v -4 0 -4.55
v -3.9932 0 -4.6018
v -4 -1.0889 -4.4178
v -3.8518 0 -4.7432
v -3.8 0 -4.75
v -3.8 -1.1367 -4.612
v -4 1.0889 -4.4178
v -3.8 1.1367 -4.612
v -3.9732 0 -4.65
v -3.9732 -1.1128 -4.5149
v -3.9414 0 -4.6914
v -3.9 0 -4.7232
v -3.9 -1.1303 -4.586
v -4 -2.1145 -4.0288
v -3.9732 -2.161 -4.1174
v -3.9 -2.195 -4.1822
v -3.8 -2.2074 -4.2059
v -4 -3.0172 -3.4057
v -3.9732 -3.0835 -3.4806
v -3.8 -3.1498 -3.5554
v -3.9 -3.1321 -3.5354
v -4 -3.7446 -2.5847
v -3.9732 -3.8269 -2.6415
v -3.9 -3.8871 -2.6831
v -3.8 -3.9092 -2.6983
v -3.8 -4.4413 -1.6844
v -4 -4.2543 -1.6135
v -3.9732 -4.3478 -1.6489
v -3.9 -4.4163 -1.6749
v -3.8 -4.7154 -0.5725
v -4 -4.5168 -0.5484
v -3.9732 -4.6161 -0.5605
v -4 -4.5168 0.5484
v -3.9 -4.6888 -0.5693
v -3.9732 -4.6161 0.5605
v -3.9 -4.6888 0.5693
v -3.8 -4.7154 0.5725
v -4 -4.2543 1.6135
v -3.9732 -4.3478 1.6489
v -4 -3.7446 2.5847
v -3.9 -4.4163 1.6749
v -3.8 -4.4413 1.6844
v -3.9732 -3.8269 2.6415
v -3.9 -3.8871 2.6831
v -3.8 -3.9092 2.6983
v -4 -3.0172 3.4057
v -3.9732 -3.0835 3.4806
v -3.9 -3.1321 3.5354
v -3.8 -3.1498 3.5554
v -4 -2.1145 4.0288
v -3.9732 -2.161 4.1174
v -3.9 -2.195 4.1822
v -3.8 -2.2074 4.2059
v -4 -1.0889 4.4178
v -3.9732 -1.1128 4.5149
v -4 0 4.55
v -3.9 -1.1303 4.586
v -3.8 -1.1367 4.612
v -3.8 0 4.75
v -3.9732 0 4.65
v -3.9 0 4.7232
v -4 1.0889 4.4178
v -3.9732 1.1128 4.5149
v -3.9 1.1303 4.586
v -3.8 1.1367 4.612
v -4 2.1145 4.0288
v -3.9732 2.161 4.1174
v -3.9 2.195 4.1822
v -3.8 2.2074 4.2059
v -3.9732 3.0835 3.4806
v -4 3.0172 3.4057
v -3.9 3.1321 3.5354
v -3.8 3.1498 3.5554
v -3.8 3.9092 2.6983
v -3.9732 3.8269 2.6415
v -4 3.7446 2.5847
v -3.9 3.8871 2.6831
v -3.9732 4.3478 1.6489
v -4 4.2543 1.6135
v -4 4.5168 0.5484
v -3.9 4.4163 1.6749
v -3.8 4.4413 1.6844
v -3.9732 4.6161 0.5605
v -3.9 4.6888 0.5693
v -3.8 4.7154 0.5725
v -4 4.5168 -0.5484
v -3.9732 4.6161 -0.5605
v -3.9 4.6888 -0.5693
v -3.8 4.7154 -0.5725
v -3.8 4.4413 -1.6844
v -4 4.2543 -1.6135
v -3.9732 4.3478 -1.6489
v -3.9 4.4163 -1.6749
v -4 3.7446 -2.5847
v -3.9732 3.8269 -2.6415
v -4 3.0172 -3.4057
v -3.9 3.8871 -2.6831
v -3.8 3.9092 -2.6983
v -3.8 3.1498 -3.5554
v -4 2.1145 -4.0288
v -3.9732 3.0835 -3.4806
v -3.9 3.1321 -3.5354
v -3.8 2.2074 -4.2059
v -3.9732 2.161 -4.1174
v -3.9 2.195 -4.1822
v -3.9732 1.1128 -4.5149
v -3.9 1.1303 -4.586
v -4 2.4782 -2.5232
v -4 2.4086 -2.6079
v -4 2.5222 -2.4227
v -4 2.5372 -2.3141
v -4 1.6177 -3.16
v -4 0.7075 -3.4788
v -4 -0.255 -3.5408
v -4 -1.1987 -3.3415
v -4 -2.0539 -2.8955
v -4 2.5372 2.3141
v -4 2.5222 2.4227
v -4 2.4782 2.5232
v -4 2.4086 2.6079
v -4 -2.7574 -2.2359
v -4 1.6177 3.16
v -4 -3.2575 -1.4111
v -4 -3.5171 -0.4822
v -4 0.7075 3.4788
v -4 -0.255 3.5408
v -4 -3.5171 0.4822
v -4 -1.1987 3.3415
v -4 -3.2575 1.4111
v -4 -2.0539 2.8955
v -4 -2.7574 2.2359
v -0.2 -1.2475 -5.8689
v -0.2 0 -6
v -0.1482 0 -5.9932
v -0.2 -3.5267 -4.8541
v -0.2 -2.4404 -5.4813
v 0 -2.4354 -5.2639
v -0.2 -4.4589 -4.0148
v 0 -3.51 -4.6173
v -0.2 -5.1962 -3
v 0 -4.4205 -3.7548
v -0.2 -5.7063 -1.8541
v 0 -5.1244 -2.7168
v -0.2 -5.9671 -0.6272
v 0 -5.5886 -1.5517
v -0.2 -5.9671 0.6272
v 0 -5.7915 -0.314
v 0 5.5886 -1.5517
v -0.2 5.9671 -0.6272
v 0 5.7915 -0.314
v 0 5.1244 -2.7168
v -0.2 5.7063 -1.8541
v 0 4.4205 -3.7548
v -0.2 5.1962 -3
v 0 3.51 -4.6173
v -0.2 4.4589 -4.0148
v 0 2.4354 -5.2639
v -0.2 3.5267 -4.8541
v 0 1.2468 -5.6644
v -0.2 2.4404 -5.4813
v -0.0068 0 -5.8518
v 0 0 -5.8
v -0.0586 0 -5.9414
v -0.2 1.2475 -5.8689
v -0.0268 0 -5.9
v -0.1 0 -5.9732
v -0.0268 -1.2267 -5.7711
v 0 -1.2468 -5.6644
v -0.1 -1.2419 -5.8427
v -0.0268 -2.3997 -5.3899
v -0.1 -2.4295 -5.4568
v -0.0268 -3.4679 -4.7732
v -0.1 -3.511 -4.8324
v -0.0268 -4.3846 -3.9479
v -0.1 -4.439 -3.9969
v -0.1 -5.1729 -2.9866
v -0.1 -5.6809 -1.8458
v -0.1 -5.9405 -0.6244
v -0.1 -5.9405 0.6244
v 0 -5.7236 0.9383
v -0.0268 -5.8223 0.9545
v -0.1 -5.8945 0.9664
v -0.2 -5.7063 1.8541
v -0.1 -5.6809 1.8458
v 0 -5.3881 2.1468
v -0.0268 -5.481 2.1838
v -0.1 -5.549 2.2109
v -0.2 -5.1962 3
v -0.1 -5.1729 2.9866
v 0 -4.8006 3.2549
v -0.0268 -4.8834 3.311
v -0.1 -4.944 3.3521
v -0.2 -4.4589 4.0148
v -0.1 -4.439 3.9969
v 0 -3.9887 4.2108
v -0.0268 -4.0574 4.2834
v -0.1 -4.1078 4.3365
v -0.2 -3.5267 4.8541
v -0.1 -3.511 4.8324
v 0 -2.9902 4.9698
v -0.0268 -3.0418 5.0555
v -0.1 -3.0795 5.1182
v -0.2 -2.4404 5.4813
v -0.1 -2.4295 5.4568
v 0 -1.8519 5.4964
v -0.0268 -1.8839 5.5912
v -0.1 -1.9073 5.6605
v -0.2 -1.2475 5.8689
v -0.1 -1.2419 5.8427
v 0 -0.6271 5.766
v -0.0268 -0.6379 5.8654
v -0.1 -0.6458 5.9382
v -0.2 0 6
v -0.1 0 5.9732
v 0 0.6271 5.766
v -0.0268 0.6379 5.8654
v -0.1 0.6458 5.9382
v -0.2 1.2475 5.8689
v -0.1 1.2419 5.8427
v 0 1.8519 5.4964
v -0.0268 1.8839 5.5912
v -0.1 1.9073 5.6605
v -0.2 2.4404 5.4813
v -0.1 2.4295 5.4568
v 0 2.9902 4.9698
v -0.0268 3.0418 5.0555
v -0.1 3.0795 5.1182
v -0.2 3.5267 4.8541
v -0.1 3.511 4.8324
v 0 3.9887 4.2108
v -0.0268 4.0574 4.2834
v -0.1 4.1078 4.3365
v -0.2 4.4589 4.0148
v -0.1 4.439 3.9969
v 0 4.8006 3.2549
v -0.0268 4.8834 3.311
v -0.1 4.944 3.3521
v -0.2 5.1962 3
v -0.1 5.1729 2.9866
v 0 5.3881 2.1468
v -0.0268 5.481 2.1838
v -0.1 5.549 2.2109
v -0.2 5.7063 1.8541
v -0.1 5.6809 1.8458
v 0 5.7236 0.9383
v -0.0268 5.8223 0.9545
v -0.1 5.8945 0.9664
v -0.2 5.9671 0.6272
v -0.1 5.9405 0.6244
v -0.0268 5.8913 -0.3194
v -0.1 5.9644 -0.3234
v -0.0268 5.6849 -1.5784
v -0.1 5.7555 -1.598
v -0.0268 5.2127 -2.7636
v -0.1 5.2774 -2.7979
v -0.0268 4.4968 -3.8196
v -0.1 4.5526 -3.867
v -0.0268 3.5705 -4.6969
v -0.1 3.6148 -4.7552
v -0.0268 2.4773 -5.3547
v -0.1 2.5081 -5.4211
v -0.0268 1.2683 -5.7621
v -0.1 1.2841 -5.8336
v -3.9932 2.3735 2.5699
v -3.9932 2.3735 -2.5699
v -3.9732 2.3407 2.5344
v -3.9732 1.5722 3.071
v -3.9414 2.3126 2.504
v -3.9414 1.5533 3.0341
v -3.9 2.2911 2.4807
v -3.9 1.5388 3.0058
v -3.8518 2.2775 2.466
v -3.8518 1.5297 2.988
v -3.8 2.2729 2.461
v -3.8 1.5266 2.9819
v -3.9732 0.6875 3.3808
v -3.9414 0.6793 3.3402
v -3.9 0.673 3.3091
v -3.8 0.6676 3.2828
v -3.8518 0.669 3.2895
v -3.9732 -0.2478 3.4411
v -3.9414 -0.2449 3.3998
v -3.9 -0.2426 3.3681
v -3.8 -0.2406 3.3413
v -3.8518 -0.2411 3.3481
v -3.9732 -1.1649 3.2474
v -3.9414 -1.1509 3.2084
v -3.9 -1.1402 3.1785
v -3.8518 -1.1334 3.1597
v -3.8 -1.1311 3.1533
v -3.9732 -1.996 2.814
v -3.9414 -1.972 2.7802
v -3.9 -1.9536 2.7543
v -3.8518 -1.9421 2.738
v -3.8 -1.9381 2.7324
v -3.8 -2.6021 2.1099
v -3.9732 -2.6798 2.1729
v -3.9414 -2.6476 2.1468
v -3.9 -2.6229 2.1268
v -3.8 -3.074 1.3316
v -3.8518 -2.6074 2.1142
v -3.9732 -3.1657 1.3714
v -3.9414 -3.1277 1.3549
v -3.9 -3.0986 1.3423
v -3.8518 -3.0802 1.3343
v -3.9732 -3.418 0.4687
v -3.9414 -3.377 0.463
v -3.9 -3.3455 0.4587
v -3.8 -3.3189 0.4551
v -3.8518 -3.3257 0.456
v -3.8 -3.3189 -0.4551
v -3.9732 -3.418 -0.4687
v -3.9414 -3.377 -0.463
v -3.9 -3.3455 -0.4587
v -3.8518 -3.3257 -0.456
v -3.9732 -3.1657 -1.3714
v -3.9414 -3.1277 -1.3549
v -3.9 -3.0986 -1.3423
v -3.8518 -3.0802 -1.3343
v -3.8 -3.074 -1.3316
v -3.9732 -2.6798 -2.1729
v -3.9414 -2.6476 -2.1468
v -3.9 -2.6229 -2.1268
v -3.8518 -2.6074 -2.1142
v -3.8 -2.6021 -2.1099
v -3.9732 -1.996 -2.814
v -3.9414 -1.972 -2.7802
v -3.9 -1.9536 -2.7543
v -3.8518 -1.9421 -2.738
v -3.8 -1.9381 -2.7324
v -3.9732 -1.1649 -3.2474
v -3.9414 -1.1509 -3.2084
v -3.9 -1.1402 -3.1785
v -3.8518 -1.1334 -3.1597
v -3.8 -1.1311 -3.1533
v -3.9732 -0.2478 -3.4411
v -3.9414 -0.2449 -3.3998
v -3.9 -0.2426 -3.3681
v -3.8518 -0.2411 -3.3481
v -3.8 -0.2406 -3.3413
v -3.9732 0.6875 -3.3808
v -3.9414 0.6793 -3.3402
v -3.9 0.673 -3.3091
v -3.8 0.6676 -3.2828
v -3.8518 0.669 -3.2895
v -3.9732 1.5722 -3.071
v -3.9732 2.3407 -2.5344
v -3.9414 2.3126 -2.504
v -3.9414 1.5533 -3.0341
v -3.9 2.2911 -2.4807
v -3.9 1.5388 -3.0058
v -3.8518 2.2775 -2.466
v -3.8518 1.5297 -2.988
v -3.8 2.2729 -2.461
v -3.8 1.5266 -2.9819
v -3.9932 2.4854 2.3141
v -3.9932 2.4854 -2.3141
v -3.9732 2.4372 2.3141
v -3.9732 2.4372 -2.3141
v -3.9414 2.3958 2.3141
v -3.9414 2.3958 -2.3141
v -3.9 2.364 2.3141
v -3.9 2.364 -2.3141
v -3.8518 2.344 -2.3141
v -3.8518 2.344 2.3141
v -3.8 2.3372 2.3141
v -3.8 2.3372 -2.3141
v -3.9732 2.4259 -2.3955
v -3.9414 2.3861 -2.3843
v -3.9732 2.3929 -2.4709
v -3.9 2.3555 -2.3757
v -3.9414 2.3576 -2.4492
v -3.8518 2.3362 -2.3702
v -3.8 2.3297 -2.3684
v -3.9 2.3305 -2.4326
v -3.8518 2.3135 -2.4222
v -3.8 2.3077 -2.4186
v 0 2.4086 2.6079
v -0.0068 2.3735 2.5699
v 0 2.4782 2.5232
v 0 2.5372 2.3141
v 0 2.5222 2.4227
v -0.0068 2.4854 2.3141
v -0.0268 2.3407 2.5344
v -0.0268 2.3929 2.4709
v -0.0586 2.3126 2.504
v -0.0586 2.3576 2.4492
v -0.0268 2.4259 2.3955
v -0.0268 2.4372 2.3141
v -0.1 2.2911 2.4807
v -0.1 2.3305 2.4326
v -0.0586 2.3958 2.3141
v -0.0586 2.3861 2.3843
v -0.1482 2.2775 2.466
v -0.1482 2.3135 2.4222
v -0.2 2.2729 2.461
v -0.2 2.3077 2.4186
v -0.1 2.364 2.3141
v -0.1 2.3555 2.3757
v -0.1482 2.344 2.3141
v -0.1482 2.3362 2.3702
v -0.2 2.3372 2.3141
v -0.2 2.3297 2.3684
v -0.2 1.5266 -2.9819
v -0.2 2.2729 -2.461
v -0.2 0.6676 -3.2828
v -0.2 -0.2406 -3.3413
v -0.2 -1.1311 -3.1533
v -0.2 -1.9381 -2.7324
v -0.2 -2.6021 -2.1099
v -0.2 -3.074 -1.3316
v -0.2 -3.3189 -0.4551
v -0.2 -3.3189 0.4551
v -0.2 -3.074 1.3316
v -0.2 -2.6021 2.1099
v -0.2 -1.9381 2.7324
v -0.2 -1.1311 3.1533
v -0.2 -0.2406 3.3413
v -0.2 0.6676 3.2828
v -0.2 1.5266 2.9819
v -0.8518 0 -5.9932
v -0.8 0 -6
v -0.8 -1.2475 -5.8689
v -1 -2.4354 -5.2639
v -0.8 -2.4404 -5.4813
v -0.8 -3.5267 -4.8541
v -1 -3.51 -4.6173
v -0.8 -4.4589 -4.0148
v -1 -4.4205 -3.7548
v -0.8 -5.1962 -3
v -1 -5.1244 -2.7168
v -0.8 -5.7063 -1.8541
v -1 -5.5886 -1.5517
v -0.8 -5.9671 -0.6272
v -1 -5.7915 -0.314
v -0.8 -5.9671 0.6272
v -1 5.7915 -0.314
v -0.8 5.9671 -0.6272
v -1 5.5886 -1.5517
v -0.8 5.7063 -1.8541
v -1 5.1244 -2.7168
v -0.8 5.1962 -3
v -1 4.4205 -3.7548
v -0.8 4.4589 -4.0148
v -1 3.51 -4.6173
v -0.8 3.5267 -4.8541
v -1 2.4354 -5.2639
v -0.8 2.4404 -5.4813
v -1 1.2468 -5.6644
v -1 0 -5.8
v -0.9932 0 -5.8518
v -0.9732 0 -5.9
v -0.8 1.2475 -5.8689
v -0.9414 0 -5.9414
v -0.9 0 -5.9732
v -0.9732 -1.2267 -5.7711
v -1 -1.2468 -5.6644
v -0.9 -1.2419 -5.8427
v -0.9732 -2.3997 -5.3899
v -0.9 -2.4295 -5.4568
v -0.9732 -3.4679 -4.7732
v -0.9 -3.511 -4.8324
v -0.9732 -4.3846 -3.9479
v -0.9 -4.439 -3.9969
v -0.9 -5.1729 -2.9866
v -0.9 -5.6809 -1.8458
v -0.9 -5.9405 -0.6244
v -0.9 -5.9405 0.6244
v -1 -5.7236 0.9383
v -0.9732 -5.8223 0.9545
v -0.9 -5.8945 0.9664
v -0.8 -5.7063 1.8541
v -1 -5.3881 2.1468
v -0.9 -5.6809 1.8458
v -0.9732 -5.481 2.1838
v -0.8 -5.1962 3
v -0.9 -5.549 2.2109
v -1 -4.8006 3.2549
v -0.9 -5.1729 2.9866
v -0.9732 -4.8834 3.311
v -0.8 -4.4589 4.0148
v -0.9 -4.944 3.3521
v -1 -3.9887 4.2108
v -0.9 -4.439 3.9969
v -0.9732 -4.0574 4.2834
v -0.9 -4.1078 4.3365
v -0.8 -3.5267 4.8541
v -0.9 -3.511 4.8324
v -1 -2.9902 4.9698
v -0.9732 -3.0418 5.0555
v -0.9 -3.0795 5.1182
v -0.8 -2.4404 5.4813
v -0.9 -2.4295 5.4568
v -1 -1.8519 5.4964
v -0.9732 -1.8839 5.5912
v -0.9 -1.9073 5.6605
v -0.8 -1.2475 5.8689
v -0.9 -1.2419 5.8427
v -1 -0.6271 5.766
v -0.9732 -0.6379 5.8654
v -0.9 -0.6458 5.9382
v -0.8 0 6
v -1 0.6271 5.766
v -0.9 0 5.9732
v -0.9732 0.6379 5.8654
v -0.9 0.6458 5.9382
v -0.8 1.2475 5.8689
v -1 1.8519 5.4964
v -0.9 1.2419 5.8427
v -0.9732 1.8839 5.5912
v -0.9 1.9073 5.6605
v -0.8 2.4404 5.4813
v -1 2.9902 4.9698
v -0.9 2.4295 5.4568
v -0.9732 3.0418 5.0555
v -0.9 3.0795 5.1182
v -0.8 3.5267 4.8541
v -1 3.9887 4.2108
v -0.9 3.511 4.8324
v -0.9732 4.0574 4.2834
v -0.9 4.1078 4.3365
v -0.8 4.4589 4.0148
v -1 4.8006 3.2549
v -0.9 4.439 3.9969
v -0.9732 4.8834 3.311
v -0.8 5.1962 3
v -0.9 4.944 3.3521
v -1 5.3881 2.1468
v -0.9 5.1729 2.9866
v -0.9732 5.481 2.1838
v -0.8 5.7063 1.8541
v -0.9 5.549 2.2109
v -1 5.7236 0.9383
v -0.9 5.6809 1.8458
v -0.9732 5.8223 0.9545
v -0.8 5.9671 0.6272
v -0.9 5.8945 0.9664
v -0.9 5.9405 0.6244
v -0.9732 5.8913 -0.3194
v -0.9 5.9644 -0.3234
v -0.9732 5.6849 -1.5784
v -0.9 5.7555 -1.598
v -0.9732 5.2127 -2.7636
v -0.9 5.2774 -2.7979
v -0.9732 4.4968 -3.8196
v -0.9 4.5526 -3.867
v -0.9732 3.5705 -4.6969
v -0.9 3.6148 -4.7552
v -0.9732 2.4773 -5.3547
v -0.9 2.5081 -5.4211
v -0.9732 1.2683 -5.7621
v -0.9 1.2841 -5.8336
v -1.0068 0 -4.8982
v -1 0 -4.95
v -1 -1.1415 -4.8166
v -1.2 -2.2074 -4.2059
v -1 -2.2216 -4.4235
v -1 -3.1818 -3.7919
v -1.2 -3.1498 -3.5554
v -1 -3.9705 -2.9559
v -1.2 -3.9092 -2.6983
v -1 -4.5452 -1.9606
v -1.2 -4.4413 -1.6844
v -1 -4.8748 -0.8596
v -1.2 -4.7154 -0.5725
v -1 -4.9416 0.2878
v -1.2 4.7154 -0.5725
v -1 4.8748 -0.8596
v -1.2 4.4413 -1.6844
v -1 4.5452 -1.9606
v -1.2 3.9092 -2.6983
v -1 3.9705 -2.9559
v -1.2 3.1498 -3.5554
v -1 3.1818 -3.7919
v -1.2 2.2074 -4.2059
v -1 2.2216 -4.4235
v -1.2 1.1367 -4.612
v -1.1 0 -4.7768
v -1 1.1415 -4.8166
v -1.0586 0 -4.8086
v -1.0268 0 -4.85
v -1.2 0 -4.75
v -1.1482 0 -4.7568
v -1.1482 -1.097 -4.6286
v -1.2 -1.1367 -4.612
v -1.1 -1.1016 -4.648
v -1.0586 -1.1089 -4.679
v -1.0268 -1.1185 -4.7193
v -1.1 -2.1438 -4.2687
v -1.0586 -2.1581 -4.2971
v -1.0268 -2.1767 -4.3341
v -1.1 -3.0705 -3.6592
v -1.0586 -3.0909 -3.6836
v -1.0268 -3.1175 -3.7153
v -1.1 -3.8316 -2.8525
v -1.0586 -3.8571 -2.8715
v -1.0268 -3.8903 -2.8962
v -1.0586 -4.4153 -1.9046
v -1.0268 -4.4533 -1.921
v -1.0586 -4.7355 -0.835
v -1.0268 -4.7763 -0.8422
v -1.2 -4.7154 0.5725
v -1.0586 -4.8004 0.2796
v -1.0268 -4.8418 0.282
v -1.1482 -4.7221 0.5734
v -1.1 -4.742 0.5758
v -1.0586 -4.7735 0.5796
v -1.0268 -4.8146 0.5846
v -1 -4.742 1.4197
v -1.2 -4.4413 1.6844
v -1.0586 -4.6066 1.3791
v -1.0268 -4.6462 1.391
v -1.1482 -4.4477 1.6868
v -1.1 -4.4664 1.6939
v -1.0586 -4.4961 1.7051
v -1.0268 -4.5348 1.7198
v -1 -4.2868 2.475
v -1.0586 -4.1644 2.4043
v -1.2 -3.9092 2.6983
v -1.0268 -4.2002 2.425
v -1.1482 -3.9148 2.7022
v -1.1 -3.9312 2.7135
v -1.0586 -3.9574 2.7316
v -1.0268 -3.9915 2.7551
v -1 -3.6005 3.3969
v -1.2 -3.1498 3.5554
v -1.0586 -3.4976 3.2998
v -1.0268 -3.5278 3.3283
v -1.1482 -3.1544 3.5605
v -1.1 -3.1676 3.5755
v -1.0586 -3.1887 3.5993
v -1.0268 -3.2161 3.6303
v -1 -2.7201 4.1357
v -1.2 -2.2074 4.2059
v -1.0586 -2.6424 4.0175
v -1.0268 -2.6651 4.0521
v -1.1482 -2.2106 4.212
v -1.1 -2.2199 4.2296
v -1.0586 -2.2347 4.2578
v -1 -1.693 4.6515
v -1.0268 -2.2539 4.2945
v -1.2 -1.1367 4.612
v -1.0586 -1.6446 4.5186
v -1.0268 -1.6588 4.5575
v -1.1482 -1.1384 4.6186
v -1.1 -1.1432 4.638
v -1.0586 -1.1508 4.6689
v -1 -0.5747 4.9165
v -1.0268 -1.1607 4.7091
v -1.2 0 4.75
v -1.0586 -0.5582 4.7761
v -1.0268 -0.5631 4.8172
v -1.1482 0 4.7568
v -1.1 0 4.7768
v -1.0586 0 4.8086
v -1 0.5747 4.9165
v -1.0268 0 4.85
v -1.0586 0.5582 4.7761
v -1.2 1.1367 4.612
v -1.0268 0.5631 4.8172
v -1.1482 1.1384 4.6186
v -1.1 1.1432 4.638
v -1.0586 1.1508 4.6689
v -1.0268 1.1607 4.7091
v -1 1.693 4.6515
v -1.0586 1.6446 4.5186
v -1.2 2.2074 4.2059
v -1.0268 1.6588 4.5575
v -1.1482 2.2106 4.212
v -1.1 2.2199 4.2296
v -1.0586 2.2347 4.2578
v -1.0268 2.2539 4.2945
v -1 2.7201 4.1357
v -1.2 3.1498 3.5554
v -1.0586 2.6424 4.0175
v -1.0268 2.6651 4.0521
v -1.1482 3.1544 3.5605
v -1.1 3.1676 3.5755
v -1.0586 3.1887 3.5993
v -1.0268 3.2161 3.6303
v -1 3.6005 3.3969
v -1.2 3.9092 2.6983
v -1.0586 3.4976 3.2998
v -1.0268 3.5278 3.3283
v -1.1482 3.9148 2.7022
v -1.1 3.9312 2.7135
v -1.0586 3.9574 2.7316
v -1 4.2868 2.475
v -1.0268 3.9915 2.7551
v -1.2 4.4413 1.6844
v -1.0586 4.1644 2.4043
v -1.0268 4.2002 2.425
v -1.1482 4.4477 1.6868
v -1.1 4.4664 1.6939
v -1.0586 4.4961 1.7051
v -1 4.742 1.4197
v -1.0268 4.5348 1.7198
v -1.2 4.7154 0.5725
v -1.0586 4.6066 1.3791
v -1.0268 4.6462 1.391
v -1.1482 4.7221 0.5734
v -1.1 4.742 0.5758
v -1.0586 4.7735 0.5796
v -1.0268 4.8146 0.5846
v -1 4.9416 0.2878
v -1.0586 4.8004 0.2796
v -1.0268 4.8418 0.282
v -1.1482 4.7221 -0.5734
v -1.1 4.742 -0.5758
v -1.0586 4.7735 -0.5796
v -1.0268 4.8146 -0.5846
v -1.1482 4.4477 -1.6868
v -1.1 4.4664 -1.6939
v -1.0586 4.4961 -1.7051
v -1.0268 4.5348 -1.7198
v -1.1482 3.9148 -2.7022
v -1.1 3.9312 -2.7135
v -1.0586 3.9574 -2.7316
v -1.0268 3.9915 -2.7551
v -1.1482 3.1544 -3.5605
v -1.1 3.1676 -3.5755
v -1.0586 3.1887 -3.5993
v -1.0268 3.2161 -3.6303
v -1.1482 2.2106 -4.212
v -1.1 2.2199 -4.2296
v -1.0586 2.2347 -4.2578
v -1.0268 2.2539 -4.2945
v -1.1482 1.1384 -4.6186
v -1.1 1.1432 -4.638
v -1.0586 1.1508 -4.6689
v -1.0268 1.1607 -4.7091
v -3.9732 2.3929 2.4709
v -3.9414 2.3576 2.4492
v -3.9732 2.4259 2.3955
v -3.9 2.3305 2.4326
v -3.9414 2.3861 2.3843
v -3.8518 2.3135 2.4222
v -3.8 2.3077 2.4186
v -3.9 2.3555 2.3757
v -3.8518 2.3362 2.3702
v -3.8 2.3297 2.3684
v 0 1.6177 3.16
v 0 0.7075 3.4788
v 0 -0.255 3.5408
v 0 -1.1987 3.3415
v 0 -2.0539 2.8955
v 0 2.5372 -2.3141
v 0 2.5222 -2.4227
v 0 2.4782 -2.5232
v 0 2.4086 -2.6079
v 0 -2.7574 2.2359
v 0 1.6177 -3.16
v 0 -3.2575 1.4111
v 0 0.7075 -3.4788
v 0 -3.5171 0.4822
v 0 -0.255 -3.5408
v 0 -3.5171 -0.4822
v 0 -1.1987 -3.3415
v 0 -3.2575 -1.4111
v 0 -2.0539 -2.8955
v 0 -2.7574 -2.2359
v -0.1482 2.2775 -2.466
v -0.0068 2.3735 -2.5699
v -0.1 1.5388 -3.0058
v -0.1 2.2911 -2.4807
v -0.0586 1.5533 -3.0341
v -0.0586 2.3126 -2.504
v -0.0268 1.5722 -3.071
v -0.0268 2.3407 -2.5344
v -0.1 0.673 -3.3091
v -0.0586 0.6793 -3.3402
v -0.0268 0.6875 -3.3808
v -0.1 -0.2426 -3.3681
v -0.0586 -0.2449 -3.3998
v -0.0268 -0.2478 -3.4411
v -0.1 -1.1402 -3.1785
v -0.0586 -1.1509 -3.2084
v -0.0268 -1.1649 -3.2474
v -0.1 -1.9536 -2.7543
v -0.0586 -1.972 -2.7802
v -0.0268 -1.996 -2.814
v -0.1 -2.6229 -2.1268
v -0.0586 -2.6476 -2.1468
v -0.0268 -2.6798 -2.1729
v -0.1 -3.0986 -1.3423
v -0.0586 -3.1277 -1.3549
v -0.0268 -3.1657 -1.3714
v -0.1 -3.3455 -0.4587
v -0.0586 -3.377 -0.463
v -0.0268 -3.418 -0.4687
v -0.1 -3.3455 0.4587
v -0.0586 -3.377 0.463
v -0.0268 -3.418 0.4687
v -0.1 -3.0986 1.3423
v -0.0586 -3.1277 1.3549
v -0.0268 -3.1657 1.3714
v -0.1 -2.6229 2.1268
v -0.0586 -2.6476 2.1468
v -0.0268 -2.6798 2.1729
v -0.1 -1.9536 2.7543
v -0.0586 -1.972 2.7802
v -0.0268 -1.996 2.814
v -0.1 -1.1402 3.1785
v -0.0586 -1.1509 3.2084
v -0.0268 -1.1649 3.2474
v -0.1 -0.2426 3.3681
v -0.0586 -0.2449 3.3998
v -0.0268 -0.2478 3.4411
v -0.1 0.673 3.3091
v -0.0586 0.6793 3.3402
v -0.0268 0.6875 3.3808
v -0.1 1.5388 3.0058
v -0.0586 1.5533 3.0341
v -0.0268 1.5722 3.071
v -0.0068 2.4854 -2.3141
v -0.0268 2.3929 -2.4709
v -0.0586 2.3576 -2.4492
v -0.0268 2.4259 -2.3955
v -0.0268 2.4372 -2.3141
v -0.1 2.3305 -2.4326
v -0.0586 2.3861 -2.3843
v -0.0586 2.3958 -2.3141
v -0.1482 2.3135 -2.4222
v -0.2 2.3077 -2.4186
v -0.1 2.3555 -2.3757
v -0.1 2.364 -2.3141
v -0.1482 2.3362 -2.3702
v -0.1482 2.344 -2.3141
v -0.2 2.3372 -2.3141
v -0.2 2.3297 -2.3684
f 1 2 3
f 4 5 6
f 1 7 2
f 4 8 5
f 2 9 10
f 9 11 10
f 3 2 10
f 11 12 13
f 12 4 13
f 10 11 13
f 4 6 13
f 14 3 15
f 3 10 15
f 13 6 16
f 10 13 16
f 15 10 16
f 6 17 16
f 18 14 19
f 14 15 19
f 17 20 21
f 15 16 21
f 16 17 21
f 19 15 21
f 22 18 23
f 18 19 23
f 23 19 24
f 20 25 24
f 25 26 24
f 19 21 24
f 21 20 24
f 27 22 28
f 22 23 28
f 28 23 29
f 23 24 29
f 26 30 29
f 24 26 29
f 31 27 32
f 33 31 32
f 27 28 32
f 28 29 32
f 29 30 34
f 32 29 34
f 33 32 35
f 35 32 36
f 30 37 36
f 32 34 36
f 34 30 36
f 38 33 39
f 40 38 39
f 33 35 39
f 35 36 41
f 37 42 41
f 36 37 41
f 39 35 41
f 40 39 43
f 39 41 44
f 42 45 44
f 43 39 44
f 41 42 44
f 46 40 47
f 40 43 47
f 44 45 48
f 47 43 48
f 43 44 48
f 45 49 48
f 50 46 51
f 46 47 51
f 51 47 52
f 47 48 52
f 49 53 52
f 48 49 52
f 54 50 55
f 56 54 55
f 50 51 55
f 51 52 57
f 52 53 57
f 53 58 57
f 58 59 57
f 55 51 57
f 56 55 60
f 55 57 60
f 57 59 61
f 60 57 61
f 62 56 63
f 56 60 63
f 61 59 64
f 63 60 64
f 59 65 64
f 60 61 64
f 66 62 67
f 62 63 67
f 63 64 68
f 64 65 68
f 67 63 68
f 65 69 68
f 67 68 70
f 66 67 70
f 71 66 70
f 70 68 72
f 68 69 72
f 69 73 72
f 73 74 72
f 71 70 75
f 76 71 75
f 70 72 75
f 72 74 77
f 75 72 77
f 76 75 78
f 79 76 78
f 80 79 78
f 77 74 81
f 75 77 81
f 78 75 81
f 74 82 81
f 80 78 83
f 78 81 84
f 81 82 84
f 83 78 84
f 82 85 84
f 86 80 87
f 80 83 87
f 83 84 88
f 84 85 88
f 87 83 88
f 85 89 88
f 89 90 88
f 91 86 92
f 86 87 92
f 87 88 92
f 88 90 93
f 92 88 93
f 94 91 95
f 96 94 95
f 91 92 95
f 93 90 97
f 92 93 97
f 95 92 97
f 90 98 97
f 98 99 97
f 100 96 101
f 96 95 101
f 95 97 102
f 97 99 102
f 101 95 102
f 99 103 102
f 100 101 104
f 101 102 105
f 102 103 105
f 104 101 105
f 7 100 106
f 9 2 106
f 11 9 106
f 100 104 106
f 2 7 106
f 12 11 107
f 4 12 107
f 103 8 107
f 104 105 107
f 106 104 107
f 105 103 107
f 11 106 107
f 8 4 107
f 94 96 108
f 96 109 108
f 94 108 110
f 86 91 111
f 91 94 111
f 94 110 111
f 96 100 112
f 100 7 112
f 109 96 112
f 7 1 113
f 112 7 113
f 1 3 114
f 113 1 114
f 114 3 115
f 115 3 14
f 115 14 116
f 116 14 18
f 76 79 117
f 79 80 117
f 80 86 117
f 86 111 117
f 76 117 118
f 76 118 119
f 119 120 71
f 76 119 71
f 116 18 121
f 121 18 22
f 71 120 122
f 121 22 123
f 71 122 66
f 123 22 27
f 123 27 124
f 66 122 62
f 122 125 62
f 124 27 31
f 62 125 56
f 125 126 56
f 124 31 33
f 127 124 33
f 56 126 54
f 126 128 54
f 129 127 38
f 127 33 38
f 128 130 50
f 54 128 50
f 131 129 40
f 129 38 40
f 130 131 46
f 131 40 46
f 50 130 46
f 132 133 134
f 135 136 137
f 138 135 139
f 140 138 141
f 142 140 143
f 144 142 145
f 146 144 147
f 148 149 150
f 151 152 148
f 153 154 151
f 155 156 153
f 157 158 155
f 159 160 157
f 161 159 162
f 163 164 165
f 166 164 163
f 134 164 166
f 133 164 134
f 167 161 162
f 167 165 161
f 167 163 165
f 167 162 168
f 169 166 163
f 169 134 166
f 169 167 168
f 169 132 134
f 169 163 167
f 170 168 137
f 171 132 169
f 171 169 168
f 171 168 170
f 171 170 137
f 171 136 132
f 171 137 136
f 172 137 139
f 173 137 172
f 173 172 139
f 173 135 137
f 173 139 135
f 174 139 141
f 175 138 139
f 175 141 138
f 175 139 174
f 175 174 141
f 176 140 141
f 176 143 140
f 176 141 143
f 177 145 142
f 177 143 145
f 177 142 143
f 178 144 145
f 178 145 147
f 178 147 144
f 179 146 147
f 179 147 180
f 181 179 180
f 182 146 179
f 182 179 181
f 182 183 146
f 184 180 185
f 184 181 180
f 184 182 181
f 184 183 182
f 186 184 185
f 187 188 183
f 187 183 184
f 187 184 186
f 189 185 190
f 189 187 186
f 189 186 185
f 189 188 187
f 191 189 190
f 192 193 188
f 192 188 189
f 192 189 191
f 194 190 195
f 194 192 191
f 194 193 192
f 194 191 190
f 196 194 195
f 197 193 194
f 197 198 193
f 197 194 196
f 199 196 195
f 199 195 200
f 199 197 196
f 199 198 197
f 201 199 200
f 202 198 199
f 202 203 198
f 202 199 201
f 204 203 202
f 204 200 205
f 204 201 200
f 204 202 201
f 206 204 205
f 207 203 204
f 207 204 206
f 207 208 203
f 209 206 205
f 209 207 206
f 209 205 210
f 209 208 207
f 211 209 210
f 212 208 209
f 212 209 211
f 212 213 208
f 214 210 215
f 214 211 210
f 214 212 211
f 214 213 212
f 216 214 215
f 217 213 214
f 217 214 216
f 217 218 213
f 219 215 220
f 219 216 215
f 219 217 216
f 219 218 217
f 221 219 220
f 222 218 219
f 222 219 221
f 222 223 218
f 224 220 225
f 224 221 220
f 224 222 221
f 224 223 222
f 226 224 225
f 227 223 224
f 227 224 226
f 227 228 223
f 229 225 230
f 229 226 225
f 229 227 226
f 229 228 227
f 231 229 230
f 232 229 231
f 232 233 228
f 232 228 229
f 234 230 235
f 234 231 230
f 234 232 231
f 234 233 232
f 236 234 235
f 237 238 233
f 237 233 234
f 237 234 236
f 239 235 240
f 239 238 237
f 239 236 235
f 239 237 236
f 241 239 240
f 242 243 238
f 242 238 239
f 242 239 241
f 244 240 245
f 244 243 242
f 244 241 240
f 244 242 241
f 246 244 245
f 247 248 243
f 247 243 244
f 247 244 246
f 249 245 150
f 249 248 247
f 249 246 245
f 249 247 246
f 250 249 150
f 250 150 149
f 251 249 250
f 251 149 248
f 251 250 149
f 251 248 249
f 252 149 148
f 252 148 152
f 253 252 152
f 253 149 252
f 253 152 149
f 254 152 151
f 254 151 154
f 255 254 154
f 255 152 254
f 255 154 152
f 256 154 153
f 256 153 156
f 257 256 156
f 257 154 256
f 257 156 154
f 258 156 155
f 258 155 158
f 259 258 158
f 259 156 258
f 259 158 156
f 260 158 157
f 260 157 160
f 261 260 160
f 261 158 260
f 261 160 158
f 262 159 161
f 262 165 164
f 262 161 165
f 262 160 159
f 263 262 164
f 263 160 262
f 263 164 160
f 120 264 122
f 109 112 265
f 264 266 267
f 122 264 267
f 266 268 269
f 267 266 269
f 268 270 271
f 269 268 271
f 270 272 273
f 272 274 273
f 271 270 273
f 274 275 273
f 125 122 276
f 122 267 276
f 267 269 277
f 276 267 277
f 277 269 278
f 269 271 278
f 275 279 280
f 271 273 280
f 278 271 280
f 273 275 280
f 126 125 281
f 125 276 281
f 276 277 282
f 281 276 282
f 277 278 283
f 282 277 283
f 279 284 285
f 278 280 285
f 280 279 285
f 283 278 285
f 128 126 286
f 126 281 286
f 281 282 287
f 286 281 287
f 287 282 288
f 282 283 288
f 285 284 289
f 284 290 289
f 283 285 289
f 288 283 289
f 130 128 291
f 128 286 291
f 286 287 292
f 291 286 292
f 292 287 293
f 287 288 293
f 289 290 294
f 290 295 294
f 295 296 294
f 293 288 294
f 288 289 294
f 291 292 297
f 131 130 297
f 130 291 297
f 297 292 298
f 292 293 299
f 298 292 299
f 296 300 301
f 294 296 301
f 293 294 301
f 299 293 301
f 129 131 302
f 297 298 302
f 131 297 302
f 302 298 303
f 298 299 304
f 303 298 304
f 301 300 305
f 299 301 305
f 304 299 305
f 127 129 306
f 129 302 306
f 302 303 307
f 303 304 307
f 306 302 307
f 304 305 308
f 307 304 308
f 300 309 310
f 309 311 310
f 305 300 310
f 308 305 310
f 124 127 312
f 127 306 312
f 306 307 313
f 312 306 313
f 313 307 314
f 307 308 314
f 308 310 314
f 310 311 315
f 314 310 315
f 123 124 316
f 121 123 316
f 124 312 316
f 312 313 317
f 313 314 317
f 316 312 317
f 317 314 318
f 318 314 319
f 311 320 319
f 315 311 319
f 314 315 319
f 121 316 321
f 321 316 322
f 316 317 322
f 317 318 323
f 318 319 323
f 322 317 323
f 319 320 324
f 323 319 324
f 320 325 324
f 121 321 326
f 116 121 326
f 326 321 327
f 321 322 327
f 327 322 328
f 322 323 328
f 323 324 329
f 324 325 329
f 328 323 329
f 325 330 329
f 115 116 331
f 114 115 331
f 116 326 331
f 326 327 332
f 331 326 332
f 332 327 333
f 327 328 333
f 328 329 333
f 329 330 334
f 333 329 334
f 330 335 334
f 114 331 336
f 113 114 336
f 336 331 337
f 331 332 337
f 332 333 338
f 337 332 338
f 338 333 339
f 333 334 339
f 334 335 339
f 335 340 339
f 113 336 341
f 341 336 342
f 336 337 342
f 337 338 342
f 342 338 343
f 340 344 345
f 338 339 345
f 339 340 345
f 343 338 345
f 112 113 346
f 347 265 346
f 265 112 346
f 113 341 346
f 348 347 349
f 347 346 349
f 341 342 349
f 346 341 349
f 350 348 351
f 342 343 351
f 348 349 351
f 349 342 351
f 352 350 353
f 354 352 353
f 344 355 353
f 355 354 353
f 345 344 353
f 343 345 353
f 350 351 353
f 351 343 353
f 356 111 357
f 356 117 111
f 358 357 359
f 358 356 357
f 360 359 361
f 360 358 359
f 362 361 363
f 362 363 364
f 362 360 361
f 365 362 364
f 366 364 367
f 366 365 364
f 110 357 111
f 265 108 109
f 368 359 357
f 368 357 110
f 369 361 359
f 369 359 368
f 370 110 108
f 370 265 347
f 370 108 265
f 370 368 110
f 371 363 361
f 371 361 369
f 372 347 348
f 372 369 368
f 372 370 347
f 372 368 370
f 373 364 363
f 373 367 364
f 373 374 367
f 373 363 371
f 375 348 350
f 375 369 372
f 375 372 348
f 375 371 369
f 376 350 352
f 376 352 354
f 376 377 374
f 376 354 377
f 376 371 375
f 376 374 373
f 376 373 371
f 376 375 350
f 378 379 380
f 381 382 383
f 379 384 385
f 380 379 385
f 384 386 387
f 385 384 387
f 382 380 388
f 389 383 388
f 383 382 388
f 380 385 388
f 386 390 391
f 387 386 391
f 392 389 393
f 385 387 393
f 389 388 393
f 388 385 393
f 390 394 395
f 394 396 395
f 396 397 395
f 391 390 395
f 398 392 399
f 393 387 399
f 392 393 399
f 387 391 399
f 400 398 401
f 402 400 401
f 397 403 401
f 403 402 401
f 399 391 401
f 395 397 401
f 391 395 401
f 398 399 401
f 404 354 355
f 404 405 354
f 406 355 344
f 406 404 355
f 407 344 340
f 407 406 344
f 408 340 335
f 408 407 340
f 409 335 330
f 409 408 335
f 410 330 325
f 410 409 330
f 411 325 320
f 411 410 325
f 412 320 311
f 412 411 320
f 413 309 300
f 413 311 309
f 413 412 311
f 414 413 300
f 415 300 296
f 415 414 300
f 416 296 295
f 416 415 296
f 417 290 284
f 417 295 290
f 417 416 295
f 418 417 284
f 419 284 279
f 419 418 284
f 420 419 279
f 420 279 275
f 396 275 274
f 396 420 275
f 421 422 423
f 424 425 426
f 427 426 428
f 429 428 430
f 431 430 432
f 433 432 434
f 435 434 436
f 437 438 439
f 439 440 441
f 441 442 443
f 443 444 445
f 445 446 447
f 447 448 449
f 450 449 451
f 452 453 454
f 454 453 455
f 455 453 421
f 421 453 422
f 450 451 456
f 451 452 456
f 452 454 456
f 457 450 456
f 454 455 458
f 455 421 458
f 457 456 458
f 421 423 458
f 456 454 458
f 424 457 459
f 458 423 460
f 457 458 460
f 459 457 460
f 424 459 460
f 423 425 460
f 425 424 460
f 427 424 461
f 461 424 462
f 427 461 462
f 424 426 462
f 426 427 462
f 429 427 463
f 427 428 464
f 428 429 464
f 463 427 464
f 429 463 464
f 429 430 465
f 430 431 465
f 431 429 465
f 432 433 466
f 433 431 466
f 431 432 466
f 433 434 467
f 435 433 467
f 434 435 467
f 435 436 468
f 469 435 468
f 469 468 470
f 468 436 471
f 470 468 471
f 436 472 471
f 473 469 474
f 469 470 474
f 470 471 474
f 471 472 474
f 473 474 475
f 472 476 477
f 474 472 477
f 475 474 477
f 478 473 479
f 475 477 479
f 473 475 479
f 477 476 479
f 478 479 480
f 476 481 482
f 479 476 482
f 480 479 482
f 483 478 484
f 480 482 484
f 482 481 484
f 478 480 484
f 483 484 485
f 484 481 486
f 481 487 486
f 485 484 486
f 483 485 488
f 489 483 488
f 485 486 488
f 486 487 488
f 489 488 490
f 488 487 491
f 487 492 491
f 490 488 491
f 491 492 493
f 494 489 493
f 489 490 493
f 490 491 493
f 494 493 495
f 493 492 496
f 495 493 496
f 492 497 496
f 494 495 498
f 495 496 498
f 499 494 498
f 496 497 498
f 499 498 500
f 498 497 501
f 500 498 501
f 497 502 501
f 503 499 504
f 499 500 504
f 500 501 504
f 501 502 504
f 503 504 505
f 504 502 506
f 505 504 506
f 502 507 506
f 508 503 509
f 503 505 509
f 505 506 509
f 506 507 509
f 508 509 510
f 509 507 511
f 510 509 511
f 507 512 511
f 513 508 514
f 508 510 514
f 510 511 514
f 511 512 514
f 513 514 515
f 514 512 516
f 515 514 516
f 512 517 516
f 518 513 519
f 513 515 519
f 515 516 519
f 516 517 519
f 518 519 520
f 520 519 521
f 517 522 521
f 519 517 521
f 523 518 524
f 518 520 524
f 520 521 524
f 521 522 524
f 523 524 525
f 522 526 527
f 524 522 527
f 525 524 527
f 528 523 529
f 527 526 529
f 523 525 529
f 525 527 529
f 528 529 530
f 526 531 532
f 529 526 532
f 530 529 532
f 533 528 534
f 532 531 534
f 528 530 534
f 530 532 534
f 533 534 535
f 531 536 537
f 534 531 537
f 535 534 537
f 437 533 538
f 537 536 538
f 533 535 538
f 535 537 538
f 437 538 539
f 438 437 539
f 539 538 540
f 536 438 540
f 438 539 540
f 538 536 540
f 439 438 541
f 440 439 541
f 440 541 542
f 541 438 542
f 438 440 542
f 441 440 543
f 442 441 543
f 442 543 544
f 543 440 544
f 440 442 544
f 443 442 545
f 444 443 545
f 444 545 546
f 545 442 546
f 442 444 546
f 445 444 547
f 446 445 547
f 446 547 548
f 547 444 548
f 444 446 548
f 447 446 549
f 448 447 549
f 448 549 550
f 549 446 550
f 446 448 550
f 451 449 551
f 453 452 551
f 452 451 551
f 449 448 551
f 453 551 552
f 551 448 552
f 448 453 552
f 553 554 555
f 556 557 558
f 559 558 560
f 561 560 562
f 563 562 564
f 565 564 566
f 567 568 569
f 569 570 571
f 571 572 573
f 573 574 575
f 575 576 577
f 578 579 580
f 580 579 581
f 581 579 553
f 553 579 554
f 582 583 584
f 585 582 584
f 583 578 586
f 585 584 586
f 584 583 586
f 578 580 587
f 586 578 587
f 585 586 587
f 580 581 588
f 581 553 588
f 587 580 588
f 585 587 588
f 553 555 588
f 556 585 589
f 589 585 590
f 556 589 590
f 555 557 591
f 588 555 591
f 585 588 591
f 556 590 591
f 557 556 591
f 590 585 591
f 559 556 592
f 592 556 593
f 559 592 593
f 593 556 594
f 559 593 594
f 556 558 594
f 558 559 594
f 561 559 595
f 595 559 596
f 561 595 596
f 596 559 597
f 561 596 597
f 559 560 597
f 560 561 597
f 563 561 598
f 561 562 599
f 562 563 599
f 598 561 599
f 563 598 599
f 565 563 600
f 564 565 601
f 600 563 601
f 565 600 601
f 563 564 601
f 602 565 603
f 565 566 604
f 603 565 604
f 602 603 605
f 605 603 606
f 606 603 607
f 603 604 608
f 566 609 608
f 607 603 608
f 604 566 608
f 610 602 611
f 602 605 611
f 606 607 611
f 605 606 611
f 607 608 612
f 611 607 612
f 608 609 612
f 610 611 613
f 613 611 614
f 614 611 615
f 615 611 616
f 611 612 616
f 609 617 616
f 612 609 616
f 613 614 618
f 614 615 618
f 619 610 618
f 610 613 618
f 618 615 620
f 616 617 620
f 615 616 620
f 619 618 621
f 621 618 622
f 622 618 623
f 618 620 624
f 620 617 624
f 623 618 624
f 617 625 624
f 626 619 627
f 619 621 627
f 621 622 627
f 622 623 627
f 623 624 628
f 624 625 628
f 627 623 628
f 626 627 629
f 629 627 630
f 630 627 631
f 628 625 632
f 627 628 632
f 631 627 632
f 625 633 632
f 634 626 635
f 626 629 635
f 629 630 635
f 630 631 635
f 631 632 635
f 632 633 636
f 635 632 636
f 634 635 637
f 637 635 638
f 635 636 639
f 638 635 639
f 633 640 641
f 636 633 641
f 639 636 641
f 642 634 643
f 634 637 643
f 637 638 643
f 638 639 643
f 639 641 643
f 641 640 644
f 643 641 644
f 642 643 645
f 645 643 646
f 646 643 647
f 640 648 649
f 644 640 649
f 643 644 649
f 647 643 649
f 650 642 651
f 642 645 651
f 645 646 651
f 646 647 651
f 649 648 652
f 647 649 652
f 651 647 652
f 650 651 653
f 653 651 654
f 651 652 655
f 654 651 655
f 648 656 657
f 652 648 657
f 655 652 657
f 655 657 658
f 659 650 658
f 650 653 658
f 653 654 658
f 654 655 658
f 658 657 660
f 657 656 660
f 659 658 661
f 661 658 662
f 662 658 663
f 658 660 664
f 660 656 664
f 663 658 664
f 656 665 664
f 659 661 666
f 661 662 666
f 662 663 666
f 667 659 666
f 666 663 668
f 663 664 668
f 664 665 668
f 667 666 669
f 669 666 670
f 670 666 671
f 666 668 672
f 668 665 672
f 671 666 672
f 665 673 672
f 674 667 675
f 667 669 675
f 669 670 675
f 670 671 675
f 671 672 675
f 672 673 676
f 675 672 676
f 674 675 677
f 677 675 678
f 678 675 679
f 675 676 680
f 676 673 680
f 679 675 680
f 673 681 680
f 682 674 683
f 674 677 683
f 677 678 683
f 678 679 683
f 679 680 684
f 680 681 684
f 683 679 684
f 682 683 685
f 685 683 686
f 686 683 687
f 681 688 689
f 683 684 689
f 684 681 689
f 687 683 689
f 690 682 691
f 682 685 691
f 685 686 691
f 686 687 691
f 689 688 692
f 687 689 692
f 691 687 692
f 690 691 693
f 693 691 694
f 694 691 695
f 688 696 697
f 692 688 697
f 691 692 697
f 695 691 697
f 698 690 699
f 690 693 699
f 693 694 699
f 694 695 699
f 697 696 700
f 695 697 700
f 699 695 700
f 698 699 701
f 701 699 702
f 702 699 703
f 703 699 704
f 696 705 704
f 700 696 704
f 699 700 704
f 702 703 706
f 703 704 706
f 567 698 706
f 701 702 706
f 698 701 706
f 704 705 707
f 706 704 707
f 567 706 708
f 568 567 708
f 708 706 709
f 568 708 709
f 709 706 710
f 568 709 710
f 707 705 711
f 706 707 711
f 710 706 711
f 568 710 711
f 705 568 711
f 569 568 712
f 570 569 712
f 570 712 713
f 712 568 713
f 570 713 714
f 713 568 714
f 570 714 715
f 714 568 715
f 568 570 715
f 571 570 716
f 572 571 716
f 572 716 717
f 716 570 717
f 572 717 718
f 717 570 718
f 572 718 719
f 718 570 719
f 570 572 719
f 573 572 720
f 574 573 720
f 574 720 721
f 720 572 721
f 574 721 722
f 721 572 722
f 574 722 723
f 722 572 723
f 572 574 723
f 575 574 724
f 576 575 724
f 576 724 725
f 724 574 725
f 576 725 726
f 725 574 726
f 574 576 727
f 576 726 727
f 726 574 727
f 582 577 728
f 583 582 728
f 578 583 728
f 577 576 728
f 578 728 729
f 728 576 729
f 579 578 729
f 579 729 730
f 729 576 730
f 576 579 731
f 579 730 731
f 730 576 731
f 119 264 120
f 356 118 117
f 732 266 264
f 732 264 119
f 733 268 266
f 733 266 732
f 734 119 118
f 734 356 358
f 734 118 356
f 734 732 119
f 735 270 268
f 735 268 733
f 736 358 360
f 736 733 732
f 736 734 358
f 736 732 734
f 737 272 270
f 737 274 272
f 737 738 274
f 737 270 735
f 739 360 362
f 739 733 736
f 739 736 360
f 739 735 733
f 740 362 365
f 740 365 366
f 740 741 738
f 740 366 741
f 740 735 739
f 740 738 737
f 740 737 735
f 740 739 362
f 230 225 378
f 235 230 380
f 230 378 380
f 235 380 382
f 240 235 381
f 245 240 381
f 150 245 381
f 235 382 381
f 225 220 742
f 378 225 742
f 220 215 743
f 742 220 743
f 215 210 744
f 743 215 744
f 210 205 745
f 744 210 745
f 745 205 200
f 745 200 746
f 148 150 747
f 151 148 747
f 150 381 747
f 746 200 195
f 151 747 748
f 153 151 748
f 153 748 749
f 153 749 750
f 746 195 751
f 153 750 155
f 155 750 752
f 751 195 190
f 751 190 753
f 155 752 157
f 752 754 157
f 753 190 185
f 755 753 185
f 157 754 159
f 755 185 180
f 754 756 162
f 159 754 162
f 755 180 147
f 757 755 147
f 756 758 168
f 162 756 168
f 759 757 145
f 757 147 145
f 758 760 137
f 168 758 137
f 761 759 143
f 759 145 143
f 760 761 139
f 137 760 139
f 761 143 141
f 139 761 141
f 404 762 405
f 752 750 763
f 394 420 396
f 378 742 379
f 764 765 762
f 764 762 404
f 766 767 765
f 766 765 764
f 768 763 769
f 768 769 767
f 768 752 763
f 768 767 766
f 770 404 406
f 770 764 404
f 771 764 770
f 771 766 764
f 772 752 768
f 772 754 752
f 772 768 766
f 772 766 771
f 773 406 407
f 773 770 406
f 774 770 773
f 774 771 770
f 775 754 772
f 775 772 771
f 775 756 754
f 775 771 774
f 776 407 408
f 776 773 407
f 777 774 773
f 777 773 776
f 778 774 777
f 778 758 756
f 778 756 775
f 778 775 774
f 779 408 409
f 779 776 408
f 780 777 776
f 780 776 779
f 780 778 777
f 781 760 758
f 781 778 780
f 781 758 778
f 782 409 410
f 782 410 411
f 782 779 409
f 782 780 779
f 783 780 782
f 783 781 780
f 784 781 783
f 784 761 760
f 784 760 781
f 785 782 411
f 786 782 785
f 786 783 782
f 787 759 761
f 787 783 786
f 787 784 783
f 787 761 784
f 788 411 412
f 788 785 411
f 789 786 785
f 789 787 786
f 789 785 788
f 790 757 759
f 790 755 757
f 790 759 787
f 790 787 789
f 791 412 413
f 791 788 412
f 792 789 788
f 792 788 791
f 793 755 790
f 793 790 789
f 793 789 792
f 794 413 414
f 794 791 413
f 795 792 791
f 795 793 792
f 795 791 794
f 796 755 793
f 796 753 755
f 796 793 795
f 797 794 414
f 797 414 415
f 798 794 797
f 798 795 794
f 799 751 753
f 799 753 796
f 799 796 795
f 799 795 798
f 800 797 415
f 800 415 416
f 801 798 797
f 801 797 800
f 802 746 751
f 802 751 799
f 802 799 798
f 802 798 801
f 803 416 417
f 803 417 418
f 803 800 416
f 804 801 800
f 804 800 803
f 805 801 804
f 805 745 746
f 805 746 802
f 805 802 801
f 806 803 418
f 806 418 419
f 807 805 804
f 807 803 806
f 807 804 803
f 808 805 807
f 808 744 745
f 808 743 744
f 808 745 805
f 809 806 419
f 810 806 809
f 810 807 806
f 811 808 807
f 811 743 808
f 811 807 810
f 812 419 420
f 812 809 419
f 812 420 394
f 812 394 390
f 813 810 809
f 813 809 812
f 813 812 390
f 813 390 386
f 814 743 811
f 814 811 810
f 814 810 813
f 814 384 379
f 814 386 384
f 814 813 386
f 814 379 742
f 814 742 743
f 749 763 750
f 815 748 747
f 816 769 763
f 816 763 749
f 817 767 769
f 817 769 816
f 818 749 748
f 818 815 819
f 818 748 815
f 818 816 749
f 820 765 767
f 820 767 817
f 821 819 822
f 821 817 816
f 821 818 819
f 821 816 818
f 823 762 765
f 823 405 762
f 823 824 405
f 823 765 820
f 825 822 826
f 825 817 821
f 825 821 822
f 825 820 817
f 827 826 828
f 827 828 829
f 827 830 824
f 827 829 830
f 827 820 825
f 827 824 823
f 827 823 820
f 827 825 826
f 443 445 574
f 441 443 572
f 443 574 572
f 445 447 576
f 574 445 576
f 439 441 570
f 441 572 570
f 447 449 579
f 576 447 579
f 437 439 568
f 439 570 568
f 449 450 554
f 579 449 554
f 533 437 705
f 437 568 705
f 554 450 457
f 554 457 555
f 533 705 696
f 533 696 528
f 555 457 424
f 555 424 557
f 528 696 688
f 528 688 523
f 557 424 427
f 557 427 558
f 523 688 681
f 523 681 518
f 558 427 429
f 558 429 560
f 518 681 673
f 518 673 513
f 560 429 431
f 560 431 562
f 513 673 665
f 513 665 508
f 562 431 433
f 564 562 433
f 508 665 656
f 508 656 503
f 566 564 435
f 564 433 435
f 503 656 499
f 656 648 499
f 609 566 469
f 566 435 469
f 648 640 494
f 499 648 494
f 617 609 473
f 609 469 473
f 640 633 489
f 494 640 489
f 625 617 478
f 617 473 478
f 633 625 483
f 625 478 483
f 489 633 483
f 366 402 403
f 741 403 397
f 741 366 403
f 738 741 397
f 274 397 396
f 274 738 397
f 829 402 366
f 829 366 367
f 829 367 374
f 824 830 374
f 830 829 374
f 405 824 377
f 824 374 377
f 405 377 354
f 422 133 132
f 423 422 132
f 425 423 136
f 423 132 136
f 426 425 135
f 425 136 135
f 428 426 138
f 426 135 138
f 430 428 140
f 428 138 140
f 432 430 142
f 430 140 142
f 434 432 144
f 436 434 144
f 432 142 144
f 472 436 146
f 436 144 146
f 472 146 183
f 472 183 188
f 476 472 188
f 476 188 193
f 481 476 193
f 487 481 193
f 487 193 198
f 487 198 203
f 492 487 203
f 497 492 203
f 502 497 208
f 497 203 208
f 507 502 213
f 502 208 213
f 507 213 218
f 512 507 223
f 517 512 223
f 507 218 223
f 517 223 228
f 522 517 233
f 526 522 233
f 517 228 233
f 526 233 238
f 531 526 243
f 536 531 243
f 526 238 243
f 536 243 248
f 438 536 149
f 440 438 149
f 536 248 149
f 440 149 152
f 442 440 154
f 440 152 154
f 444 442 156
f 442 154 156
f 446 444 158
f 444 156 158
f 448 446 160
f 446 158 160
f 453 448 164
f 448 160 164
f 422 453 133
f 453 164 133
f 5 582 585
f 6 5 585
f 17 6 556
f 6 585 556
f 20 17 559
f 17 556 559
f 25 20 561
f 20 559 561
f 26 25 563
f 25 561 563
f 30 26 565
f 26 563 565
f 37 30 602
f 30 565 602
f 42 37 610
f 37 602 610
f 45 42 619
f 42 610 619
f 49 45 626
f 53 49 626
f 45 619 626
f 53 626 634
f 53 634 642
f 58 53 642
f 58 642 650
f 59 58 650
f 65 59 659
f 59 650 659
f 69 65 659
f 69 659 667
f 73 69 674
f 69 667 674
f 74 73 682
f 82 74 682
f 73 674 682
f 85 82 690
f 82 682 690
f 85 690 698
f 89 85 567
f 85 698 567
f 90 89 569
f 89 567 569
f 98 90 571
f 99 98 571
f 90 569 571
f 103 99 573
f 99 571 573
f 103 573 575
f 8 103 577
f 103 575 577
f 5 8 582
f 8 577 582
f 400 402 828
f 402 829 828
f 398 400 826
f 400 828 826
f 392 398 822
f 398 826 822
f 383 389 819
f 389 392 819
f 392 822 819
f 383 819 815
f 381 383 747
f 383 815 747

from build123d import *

# Parameters (mm, degrees)
CUT_EXTRUDE1_REACH = 11.381
FILLET1_R          = 0.2


with BuildPart() as part:
    # Sketch1 → Revolve1 (revolve)
    with BuildSketch(Plane.XY, mode=Mode.PRIVATE) as revolve1_sk:
        Polygon((-4, 0), (-4, 4.75), (-1, 4.75), (-1, 6), (0, 6), (0, 0), align=None)
    revolve(revolve1_sk.sketch.rotate(Axis((0, 0, 0), (-1, 0, 0)), 90), axis=Axis((0, 0, 0), (-1, 0, 0)))

    # Sketch2 → Cut-Extrude1 (cut, up to next)
    with BuildSketch(Plane(origin=(0, 0, 0), x_dir=(0, 0, -1), z_dir=(1, 0, 0)), mode=Mode.PRIVATE) as cut_extrude1_sk1:
        with BuildLine():
            Line((-2.4, 2.337199179), (2.4, 2.337199179))
            ThreePointArc((2.4, 2.337199179), (0, -3.35), (-2.4, 2.337199179))
        make_face()
    cut_extrude1_tool1 = extrude(cut_extrude1_sk1.sketch, amount=-CUT_EXTRUDE1_REACH, mode=Mode.PRIVATE) & part.part
    add(cut_extrude1_tool1.solids().sort_by_distance((0, -0.288877, 0))[0], mode=Mode.SUBTRACT)

    # Fillet1
    fillet1_edges = [part.edges().sort_by_distance(p)[0] for p in [
        (-4, -3.35, 0),
        (-2, 2.337199179, -2.4),
        (-4, 2.337199179, 0),
        (-2, 2.337199179, 2.4),
        (0, -3.35, 0),
        (0, 2.337199179, 0),
        (0, 0, 6),
        (-1, 0, 6),
        (-1, 0, 4.75),
        (-4, 0, 4.75),
    ]]
    fillet(fillet1_edges, radius=FILLET1_R)


solid = part.part
